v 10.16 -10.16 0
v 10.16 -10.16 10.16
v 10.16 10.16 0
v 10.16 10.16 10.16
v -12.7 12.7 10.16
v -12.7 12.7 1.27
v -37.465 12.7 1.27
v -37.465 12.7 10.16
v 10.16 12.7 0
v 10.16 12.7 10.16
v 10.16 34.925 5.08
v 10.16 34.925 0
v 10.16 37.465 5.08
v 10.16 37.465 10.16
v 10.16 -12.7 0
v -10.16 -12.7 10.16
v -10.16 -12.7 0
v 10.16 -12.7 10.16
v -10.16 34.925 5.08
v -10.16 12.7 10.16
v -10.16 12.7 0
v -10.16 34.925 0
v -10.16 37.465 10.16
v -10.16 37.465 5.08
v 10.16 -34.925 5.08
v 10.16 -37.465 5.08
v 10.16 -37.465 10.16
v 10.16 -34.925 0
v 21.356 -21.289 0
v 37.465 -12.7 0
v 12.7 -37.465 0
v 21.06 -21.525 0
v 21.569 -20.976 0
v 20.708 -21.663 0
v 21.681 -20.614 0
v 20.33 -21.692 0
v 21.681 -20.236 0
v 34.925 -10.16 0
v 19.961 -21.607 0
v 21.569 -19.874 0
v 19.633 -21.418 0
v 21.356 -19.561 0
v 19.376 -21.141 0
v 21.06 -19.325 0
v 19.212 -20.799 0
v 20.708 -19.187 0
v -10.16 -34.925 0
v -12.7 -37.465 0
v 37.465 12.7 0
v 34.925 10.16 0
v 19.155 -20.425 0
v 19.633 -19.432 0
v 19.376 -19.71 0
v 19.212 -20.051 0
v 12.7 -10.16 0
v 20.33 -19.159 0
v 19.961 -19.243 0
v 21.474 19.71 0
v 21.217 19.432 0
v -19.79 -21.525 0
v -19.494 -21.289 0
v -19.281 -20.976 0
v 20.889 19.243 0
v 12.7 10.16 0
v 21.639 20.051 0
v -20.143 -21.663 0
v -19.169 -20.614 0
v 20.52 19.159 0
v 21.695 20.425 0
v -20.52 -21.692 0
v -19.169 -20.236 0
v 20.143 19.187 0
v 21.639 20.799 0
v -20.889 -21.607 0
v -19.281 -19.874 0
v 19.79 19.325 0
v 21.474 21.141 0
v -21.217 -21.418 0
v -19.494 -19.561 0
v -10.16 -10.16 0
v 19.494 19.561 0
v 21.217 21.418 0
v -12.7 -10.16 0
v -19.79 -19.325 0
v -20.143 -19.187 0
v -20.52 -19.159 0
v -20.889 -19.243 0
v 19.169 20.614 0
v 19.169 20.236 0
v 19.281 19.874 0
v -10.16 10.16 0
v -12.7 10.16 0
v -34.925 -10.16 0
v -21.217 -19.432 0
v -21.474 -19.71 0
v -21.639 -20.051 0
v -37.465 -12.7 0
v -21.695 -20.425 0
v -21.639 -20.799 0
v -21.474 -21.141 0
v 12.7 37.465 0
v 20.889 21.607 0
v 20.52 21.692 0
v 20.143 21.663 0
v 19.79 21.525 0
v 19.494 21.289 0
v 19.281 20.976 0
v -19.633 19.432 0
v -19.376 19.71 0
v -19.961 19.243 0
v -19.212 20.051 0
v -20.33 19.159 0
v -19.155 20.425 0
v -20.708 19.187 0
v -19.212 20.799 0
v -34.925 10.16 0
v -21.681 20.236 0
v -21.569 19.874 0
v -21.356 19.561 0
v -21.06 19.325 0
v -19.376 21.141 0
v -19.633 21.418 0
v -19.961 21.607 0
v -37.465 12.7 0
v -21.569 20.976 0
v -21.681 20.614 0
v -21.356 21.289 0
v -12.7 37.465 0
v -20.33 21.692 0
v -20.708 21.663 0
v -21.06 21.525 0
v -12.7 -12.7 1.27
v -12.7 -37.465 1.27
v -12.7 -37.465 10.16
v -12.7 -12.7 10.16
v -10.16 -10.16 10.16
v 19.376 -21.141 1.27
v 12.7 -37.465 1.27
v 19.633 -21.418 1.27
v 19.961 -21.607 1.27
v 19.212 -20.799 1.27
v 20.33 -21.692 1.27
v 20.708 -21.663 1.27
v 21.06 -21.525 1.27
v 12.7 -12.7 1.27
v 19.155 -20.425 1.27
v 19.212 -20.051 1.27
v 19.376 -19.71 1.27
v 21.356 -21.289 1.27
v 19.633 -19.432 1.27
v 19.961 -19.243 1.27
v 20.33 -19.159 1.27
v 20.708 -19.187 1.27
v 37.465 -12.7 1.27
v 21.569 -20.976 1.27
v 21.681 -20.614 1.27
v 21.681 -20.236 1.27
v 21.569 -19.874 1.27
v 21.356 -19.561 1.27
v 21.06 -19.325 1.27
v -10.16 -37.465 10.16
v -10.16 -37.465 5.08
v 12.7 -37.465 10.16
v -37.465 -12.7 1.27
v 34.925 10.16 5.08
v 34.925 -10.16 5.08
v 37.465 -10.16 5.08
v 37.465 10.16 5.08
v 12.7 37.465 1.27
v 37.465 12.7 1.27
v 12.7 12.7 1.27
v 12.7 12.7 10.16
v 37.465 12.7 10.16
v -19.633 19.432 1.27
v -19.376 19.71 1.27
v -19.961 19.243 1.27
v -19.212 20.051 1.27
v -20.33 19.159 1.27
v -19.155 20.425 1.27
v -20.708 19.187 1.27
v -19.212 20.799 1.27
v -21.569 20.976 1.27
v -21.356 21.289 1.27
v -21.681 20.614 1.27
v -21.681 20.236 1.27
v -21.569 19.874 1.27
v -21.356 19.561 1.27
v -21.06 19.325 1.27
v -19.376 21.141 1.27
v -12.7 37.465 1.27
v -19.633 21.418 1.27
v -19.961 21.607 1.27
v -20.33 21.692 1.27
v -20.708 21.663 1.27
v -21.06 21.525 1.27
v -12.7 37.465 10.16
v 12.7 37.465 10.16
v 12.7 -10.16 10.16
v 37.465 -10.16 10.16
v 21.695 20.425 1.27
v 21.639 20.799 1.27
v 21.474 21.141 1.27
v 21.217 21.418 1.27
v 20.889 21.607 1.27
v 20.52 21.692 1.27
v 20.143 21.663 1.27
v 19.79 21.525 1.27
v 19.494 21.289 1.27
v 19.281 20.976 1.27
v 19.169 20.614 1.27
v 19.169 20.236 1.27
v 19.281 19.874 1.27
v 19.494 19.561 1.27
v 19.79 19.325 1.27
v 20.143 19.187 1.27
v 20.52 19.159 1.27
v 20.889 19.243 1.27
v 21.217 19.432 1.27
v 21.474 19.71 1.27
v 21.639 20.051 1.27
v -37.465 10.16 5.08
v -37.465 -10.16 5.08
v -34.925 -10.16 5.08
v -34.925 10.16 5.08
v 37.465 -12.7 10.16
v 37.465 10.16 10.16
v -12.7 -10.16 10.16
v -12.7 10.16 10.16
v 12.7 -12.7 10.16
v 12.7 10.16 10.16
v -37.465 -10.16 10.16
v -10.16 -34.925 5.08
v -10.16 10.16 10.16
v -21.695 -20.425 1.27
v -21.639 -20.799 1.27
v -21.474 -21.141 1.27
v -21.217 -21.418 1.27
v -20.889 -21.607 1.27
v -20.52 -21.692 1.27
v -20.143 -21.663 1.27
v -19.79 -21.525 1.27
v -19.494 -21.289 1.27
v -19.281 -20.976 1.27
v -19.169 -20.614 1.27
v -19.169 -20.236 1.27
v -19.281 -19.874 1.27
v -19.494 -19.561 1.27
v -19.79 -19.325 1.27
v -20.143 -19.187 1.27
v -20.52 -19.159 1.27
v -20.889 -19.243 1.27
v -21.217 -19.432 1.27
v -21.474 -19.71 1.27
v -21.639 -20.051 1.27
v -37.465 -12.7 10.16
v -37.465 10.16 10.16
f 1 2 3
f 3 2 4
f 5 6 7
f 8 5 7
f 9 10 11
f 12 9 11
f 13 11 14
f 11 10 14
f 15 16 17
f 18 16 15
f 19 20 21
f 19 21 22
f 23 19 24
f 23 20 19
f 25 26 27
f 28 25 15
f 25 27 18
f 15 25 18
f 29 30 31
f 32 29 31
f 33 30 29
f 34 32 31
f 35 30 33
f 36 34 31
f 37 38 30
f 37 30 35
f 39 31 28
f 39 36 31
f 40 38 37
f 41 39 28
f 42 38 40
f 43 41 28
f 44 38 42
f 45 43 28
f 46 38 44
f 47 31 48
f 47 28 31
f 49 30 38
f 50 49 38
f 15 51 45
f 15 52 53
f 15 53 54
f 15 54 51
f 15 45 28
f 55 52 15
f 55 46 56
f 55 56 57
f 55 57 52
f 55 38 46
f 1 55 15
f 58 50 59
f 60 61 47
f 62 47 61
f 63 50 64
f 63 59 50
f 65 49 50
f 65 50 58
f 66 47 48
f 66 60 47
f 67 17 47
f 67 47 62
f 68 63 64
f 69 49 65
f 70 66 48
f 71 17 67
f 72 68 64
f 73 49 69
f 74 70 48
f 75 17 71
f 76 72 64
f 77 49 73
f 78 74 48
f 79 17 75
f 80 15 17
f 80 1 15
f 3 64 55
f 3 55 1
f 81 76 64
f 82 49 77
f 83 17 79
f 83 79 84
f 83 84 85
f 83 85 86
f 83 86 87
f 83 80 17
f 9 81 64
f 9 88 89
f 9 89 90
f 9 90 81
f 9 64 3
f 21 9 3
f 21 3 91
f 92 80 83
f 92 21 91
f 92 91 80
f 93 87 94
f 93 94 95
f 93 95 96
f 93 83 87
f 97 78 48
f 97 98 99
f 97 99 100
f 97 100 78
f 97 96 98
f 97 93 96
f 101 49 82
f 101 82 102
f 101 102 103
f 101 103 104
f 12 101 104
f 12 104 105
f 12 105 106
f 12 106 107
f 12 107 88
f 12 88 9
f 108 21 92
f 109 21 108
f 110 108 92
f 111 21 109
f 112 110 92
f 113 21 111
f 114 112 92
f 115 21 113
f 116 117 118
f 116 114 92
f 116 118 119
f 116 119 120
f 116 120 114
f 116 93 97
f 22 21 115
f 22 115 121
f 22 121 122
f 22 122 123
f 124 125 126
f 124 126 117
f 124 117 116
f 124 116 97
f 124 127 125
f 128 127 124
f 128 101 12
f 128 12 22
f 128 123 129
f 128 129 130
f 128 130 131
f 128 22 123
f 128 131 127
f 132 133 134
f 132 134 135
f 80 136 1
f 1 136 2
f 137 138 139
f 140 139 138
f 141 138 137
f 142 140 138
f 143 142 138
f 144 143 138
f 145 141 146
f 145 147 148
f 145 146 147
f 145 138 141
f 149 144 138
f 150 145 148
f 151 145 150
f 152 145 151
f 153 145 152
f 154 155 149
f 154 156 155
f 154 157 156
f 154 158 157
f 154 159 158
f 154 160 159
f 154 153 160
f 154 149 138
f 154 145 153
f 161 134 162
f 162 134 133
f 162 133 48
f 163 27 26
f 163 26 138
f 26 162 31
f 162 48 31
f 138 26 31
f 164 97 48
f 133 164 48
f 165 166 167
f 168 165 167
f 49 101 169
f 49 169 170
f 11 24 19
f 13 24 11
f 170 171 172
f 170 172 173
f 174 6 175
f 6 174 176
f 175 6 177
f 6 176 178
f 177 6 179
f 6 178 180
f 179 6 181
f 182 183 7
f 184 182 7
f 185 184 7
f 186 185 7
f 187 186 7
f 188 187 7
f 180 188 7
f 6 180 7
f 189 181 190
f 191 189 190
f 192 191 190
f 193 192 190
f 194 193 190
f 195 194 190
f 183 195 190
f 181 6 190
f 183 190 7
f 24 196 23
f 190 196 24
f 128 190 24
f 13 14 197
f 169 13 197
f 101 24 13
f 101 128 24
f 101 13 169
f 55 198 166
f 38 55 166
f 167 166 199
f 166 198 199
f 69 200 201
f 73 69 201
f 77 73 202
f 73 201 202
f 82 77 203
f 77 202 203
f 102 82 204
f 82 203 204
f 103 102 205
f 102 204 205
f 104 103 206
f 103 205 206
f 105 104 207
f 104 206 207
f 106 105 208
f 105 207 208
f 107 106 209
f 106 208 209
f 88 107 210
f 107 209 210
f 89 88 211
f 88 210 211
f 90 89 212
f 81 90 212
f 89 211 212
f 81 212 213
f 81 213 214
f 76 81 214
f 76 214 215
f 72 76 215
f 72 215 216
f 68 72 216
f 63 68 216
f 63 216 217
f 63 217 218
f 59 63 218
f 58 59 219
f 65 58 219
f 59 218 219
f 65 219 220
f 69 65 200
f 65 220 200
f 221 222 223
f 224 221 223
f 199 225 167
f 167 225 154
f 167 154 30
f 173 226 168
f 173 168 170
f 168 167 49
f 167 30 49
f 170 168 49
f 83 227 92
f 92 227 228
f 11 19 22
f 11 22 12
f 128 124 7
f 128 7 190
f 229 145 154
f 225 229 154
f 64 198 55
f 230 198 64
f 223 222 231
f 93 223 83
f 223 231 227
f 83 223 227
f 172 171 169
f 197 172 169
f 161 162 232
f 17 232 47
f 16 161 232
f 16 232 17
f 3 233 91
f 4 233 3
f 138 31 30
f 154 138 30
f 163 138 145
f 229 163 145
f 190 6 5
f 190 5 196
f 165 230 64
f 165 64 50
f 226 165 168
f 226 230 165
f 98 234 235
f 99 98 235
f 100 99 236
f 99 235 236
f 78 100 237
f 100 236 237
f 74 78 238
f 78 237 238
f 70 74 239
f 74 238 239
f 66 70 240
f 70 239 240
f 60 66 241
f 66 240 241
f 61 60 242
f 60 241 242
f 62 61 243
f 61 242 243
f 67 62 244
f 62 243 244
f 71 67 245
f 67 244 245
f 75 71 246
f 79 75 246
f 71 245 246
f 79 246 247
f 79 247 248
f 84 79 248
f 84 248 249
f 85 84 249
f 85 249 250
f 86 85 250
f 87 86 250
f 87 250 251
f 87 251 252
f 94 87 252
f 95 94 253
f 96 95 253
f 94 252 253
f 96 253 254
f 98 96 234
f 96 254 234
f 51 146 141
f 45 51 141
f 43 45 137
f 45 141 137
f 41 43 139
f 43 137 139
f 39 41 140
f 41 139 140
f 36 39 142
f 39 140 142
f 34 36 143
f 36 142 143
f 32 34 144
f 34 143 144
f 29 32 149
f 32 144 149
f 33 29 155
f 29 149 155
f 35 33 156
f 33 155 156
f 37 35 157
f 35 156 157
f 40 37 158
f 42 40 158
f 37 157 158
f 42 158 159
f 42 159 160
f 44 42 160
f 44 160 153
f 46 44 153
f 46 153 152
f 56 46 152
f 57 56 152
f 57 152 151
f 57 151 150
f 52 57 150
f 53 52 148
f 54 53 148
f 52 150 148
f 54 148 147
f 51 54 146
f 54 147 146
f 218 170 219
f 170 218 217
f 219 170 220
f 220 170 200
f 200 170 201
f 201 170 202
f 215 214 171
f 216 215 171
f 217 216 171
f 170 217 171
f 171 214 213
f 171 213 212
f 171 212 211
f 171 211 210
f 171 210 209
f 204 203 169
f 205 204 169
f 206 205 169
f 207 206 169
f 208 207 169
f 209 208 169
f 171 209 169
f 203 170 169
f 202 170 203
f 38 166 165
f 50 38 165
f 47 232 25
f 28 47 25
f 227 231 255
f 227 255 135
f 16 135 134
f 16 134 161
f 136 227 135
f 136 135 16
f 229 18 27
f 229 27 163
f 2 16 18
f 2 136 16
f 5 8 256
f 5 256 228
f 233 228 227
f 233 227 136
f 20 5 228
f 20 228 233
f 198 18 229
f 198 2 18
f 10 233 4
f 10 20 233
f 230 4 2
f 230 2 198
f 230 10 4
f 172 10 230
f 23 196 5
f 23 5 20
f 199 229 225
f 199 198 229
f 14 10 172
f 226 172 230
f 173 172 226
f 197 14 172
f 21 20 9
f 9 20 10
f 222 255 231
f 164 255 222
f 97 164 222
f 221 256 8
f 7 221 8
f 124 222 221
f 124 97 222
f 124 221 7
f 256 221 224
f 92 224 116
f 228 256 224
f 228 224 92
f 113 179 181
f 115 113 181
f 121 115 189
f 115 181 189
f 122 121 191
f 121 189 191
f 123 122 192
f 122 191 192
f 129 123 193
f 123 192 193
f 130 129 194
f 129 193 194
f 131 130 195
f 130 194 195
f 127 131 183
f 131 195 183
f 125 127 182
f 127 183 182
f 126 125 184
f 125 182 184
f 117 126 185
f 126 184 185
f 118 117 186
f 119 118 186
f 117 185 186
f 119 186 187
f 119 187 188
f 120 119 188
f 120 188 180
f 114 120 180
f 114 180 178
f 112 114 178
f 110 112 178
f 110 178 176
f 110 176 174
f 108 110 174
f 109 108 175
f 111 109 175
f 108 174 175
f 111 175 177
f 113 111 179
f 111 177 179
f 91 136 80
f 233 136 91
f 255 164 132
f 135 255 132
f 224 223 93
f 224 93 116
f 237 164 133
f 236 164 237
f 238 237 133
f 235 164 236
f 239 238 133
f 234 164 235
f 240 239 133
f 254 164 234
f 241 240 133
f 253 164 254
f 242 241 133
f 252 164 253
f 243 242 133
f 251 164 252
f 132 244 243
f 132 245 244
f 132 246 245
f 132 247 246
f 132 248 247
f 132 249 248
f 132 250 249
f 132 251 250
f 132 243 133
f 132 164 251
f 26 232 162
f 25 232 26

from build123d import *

# Parameters (mm, degrees)
SKETCH1_W           = 24.765
SKETCH1_H           = 25.4
SKETCH1_W_2         = 25.4
SKETCH1_H_2         = 24.765
BOSS_EXTRUDE1_DEPTH = 10.16
SKETCH2_W           = 20.32
SKETCH2_H           = 20.32
SKETCH2_H_2         = 22.225
SKETCH2_W_2         = 22.225
CUT_EXTRUDE1_DEPTH  = 10.16
SKETCH4_W           = 20.32
SKETCH4_H           = 2.54
SKETCH4_W_2         = 2.54
SKETCH4_H_2         = 20.32
CUT_EXTRUDE2_DEPTH  = 5.08
BOSS_EXTRUDE2_DEPTH = 1.27
SKETCH6_R           = 1.27
CUT_EXTRUDE3_DEPTH  = 1.27


with BuildPart() as part:
    # Sketch1 → Boss-Extrude1 (new body)
    with BuildSketch(Plane.XY):
        with Locations((-25.0825, 0)):
            Rectangle(SKETCH1_W, SKETCH1_H)
        Rectangle(SKETCH1_W_2, SKETCH1_H)
        with Locations((0, 25.0825)):
            Rectangle(SKETCH1_W_2, SKETCH1_H_2)
        with Locations((25.0825, 0)):
            Rectangle(SKETCH1_W, SKETCH1_H)
        with Locations((0, -25.0825)):
            Rectangle(SKETCH1_W_2, SKETCH1_H_2)
    extrude(amount=BOSS_EXTRUDE1_DEPTH)

    # Sketch2 → Cut-Extrude1 (cut)
    with BuildSketch(Plane.XY.offset(10.16)):
        Rectangle(SKETCH2_W, SKETCH2_H)
        with Locations((0, 23.8125)):
            Rectangle(SKETCH2_W, SKETCH2_H_2)
        with Locations((0, -23.8125)):
            Rectangle(SKETCH2_W, SKETCH2_H_2)
        with Locations((-23.8125, 0)):
            Rectangle(SKETCH2_W_2, SKETCH2_H)
        with Locations((23.8125, 0)):
            Rectangle(SKETCH2_W_2, SKETCH2_H)
    extrude(amount=-CUT_EXTRUDE1_DEPTH, mode=Mode.SUBTRACT)

    # Sketch4 → Cut-Extrude2 (cut)
    with BuildSketch(Plane.XY.offset(10.16)):
        with Locations((0, 36.195)):
            Rectangle(SKETCH4_W, SKETCH4_H)
        with Locations((36.195, 0)):
            Rectangle(SKETCH4_W_2, SKETCH4_H_2)
        with Locations((-36.195, 0)):
            Rectangle(SKETCH4_W_2, SKETCH4_H_2)
        with Locations((0, -36.195)):
            Rectangle(SKETCH4_W, SKETCH4_H)
    extrude(amount=-CUT_EXTRUDE2_DEPTH, mode=Mode.SUBTRACT)

    # Sketch5 → Boss-Extrude2 (add)
    with BuildSketch(Plane.XY):
        Polygon((-37.465, 12.7), (-12.7, 37.465), (-12.7, 12.7), align=None)
        Polygon((12.7, 37.465), (37.465, 12.7), (12.7, 12.7), align=None)
        Polygon((37.465, -12.7), (12.7, -12.7), (12.7, -37.465), align=None)
        Polygon((-12.7, -37.465), (-12.7, -12.7), (-37.465, -12.7), align=None)
    extrude(amount=BOSS_EXTRUDE2_DEPTH)

    # Sketch6 → Cut-Extrude3 (cut)
    with BuildSketch(Plane.XY.offset(1.27)):
        with Locations((-20.425141584, 20.425141584)):
            Circle(SKETCH6_R)
        with Locations((20.425141584, 20.425141584)):
            Circle(SKETCH6_R)
        with Locations(Location((20.425141584, -20.425141584, 0), (0, 0, 180))):
            Circle(SKETCH6_R)
        with Locations(Location((-20.425141584, -20.425141584, 0), (0, 0, 180))):
            Circle(SKETCH6_R)
    extrude(amount=-CUT_EXTRUDE3_DEPTH, mode=Mode.SUBTRACT)


solid = part.part
